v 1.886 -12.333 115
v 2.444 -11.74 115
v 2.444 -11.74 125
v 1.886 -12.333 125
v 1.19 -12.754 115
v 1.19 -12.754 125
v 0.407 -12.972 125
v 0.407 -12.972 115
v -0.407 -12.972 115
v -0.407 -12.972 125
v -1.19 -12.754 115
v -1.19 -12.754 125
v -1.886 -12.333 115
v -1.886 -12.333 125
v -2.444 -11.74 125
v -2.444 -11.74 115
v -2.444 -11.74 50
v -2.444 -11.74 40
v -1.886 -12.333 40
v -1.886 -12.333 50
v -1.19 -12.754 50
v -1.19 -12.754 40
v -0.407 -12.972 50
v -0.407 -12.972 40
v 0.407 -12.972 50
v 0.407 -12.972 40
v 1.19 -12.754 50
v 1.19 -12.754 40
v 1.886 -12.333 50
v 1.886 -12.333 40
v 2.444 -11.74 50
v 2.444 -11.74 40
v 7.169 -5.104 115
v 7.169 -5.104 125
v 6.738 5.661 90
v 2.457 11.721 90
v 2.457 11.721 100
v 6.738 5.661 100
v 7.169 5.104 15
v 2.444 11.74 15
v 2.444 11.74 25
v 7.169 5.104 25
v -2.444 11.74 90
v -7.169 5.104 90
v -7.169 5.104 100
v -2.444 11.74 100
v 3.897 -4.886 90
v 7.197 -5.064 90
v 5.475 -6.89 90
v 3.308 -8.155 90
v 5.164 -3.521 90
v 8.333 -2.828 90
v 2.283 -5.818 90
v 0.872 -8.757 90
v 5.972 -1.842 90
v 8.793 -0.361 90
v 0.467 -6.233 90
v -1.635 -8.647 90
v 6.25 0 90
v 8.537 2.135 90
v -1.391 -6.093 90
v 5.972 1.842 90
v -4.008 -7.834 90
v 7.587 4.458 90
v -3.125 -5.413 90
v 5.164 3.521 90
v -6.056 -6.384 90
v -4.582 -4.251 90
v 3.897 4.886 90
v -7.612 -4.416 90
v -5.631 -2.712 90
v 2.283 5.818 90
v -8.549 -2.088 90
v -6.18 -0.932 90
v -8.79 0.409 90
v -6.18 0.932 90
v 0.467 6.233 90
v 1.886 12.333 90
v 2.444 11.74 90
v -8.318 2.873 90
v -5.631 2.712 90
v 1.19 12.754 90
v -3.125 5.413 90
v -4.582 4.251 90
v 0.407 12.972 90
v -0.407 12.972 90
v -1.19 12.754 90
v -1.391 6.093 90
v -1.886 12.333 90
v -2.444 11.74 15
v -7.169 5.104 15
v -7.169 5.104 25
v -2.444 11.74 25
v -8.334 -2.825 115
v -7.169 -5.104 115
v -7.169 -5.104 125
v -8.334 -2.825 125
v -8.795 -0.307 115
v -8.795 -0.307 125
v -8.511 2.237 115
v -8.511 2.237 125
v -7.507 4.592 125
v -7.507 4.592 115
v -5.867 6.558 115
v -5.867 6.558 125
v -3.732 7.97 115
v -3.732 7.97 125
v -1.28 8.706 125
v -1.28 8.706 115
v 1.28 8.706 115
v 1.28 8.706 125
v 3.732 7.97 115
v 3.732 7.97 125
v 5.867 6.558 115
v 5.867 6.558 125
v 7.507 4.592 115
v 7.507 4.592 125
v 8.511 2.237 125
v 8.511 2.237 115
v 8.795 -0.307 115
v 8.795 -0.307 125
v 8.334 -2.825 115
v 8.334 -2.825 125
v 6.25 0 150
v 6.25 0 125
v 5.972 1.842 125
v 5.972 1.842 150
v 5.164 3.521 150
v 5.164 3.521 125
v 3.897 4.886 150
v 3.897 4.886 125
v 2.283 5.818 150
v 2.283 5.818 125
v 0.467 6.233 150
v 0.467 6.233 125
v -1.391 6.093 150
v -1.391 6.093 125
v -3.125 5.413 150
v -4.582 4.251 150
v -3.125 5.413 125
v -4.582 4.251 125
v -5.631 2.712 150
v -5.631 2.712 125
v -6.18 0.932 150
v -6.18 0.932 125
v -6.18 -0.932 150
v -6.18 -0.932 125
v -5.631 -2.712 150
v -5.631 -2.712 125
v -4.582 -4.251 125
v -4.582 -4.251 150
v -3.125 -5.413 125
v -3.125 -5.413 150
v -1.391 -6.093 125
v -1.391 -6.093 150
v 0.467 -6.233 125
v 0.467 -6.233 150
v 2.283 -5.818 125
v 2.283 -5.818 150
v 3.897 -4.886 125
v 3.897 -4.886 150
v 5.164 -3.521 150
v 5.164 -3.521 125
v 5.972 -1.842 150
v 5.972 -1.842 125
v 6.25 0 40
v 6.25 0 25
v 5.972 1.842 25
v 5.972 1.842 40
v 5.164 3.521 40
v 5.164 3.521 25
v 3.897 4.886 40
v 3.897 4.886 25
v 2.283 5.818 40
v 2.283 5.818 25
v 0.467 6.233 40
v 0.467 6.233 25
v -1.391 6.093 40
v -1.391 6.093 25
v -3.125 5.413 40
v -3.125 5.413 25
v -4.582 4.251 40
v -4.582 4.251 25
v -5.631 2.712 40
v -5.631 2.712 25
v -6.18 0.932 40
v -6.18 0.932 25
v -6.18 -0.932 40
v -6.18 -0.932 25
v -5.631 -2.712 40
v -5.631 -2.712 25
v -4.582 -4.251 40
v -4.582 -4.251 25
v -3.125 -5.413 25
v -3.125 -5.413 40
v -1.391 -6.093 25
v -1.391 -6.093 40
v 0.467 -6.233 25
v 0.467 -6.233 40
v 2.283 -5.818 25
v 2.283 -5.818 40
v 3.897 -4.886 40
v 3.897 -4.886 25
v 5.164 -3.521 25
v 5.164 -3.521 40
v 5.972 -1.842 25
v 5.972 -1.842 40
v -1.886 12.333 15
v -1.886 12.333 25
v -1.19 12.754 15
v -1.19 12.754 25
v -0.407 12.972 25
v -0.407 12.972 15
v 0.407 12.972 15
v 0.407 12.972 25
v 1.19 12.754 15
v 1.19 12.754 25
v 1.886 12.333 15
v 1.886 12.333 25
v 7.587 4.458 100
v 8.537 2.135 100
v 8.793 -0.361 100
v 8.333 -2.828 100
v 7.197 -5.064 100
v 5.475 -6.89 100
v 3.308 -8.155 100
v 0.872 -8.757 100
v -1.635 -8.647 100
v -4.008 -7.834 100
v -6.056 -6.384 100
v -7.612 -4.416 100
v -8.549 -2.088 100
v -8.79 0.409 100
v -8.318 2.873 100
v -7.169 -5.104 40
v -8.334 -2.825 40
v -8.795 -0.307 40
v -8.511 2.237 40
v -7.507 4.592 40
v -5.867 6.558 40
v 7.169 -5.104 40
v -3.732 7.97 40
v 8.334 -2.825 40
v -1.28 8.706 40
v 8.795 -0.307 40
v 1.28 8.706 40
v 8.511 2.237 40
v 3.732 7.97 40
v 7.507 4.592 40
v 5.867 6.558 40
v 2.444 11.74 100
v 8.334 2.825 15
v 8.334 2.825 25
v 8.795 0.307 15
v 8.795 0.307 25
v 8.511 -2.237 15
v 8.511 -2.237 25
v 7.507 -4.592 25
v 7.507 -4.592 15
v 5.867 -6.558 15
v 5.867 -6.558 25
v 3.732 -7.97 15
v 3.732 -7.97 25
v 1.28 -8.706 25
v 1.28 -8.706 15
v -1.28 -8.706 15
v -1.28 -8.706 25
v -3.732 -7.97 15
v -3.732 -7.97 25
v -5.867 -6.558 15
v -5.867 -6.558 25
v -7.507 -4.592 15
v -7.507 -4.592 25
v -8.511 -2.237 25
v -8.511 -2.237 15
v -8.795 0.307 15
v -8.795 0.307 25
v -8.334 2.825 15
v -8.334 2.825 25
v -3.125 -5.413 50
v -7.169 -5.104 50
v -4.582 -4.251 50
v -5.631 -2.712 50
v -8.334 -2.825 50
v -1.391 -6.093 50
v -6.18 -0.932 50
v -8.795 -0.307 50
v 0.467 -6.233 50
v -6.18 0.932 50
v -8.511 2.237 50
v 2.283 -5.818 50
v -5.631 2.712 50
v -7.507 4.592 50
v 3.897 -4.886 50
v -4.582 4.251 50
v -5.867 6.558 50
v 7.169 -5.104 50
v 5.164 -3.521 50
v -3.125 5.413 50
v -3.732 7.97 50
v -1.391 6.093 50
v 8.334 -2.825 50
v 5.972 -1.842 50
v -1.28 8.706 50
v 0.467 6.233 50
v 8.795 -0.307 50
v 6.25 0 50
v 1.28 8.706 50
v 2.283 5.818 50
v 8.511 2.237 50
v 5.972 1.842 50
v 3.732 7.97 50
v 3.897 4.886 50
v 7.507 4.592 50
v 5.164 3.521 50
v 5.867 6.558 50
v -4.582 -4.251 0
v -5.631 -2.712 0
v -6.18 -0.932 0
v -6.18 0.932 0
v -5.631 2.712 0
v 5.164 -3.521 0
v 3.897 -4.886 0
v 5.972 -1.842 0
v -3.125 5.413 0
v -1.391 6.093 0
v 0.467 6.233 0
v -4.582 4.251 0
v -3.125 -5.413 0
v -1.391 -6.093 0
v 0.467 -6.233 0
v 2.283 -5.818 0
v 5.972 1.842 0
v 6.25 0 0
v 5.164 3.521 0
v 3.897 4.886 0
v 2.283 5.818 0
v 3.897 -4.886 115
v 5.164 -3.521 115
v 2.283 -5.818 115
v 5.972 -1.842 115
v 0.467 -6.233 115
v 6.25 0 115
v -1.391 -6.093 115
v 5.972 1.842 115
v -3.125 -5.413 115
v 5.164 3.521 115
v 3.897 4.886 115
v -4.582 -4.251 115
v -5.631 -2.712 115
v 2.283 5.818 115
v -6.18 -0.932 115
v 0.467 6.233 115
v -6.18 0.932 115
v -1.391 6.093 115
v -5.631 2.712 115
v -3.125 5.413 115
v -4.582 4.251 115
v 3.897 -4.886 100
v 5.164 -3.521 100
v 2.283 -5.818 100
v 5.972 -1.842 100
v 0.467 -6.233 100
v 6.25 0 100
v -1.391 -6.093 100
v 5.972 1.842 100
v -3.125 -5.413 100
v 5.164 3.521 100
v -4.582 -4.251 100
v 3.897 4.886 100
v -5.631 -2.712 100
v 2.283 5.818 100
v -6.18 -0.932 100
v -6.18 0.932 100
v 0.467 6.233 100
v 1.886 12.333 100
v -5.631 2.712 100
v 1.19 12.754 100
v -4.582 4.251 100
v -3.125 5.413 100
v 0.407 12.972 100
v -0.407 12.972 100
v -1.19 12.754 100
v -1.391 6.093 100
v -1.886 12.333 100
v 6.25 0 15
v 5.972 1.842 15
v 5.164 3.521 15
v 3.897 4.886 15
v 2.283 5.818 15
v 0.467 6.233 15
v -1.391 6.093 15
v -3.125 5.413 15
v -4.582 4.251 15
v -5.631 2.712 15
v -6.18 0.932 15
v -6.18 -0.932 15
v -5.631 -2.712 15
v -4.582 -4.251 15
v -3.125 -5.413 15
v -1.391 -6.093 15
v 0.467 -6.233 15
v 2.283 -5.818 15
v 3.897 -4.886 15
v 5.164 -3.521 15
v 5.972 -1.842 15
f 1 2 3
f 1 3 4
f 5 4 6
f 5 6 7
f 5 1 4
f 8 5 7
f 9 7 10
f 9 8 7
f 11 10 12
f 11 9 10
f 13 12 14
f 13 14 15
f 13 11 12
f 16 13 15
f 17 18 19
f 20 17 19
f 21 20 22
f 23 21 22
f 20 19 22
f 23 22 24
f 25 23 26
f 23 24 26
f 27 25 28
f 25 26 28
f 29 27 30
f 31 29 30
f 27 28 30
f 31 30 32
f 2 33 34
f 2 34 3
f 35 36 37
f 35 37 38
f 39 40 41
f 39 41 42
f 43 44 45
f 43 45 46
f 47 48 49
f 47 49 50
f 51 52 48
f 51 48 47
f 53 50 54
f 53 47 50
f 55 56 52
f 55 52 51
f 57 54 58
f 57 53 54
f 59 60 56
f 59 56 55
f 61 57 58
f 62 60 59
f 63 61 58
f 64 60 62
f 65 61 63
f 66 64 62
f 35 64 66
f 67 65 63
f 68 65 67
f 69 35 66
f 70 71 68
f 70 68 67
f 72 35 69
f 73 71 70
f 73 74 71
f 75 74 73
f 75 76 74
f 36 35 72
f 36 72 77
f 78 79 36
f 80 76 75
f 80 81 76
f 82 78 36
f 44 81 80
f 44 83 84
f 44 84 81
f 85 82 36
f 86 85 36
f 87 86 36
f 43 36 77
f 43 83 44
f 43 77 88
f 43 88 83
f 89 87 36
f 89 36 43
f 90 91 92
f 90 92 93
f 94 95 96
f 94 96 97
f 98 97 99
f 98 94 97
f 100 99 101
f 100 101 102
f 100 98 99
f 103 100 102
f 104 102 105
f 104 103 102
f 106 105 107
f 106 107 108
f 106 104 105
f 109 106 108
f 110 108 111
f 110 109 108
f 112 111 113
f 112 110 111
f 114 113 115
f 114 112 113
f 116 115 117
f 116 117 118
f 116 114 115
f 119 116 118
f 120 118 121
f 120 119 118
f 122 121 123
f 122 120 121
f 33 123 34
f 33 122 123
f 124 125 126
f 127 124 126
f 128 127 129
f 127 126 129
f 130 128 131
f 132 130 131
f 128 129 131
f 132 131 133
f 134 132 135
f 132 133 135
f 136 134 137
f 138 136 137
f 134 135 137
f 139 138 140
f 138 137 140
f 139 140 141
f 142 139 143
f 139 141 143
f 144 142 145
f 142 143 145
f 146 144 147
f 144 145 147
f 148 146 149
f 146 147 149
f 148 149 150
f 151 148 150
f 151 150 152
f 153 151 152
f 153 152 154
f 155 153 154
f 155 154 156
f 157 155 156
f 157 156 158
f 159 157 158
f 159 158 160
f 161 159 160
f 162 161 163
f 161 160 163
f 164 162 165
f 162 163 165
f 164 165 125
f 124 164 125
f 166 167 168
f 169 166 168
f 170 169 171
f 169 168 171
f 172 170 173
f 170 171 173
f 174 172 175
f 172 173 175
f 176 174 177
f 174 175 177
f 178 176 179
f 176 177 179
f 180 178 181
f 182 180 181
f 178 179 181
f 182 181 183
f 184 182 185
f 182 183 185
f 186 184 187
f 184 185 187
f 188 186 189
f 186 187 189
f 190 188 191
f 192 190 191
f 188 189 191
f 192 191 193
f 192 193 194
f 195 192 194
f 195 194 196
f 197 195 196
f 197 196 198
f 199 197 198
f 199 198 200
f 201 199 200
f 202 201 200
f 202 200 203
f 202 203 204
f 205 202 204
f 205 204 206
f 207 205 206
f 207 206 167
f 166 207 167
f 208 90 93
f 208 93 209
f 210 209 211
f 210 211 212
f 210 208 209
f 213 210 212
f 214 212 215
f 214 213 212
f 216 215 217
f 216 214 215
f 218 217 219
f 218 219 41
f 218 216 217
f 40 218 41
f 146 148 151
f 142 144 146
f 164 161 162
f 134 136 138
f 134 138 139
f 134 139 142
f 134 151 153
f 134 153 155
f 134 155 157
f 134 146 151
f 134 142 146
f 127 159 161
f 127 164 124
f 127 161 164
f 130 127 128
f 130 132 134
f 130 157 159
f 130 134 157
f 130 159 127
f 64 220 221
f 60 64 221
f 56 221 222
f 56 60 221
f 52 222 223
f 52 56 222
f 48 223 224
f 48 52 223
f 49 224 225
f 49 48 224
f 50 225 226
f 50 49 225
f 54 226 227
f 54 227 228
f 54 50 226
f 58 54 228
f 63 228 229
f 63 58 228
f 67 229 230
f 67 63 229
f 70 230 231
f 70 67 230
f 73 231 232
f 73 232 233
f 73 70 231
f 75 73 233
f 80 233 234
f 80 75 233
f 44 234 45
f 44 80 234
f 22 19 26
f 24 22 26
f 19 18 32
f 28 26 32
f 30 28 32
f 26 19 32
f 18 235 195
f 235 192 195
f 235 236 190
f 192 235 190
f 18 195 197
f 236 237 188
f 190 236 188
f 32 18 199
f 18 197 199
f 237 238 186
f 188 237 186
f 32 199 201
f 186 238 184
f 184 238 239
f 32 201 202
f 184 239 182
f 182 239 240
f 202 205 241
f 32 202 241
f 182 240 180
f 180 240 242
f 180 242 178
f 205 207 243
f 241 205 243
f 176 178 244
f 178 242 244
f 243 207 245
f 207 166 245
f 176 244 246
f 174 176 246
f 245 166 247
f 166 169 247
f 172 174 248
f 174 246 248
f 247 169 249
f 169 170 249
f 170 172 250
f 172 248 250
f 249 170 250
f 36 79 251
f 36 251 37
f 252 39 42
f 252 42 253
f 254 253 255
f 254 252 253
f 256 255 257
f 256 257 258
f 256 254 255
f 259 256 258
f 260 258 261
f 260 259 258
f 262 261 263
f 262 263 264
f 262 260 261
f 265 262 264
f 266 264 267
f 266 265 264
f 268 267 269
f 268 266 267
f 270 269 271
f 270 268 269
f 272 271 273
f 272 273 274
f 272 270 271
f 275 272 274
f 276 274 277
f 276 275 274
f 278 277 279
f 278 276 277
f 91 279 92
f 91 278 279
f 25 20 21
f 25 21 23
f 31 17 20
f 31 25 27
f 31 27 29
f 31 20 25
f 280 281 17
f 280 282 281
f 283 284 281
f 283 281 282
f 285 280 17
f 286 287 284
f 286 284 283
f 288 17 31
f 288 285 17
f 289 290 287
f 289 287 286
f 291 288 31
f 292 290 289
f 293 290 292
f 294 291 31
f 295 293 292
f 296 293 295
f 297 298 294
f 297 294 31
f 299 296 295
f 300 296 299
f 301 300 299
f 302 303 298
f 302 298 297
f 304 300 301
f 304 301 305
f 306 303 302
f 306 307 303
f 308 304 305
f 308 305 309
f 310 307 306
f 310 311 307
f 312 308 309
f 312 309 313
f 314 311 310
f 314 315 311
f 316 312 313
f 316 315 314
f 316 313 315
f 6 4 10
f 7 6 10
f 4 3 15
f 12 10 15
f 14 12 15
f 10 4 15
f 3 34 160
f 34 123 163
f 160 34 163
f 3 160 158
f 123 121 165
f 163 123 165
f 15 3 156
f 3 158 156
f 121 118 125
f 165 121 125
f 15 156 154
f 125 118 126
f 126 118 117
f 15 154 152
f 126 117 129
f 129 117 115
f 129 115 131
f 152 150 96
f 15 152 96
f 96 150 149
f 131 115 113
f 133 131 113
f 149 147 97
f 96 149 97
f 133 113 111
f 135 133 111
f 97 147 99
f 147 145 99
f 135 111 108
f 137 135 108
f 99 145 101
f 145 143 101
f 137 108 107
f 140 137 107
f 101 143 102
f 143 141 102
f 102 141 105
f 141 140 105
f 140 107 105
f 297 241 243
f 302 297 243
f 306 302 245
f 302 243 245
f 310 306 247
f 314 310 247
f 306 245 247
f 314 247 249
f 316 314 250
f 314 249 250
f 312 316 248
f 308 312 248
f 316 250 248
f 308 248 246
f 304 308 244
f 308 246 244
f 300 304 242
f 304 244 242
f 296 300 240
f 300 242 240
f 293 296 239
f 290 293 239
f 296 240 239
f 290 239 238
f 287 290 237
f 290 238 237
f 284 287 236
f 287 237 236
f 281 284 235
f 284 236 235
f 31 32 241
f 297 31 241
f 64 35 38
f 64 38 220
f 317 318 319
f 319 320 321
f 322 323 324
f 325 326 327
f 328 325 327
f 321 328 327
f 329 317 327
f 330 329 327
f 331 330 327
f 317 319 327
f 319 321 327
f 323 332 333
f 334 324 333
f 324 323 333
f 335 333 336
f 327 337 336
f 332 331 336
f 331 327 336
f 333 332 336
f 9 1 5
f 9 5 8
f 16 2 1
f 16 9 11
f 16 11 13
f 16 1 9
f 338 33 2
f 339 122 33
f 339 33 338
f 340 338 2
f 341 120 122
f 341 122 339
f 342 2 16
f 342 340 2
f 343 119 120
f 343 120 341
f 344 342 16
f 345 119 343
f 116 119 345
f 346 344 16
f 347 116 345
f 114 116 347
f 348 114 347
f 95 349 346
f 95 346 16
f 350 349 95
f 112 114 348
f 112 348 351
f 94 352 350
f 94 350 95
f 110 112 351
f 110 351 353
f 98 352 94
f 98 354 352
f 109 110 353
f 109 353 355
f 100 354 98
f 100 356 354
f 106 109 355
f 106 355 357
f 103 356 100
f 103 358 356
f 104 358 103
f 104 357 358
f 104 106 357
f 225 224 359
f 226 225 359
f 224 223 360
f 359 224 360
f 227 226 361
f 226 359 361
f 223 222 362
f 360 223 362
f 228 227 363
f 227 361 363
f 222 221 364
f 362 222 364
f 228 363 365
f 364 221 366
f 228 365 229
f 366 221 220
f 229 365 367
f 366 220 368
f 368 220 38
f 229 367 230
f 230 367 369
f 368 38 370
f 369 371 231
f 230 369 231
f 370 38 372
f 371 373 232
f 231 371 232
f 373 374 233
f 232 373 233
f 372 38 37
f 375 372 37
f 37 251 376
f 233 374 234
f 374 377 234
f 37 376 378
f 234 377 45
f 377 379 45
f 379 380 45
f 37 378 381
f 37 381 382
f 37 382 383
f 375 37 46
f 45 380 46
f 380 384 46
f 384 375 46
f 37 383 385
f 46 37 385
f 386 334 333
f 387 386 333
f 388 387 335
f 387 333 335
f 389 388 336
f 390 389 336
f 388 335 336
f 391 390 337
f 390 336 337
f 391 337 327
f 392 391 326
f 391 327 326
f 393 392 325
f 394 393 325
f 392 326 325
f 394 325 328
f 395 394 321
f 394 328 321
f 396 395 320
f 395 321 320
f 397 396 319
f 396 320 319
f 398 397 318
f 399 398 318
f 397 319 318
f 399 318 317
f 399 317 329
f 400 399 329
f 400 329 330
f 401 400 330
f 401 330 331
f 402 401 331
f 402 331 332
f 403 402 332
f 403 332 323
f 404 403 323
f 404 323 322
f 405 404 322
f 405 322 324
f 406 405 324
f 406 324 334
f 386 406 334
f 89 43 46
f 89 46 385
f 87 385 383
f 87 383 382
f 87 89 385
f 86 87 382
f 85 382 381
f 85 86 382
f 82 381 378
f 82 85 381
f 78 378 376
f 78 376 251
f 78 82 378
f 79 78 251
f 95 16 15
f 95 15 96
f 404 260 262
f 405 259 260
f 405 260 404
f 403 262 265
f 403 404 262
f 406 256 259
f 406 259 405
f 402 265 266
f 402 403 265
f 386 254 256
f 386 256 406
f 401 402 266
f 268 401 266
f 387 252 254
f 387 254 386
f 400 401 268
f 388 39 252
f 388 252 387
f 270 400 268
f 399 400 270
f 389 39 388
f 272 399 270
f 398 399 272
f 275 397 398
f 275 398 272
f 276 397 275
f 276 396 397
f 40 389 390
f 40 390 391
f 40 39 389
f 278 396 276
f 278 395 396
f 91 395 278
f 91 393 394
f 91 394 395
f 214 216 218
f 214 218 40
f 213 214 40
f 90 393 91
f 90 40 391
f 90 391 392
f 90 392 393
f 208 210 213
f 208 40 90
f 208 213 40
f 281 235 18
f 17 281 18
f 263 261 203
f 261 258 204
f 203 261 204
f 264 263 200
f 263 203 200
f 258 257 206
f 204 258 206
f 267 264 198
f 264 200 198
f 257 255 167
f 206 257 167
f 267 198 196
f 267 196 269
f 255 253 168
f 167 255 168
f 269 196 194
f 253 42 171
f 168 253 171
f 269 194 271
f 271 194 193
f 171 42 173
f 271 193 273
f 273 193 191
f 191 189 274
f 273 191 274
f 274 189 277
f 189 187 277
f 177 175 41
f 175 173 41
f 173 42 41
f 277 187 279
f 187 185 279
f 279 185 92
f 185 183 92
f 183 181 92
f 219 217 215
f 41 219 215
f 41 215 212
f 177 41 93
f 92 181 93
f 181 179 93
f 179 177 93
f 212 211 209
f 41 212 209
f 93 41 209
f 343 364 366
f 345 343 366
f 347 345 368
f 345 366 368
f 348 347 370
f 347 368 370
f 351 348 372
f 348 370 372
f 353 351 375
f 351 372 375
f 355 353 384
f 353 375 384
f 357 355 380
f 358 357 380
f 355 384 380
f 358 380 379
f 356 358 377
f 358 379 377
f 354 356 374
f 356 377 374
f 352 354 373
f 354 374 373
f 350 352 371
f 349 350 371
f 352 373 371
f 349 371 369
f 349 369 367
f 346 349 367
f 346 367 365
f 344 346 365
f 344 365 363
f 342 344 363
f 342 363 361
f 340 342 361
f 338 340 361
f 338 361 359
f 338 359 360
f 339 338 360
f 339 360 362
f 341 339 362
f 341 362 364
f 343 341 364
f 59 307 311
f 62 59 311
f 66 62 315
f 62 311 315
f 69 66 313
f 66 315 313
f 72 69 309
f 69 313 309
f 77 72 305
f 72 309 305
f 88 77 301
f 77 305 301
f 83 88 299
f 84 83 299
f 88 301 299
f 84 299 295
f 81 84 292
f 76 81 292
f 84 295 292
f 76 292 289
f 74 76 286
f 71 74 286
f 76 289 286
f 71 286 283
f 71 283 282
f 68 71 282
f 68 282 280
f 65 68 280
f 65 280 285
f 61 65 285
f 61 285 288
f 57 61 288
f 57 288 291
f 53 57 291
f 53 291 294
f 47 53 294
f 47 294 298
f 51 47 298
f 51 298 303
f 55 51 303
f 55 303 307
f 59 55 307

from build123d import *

# Parameters (mm, degrees)
SKETCH1_R           = 6.25
BOSS_EXTRUDE1_DEPTH = 125
SKETCH3_R           = 6.25
BOSS_EXTRUDE2_DEPTH = 10
SKETCH6_R           = 6.25
BOSS_EXTRUDE3_DEPTH = 10
SKETCH8_R           = 6.25
BOSS_EXTRUDE4_DEPTH = 10
SKETCH9_R           = 6.25
BOSS_EXTRUDE6_DEPTH = 10
SKETCH14_R          = 6.25
BOSS_EXTRUDE7_DEPTH = 25


with BuildPart() as part:
    # Sketch1 → Boss-Extrude1 (new body)
    with BuildSketch(Plane.XY):
        Circle(SKETCH1_R)
    extrude(amount=BOSS_EXTRUDE1_DEPTH)

    # Sketch3 → Boss-Extrude2 (add)
    with BuildSketch(Plane(origin=(0, 0, 15), x_dir=(-1, 0, 0), z_dir=(0, 0, -1))):
        with BuildLine():
            Line((-2.443849423, 11.74), (-7.168624973, 5.104))
            ThreePointArc((-7.168624973, 5.104), (0, -8.8), (7.168624973, 5.104))
            Line((7.168624973, 5.104), (2.443849423, 11.74))
            ThreePointArc((2.443849423, 11.74), (0, 13), (-2.443849423, 11.74))
        make_face()
        Circle(SKETCH3_R, mode=Mode.SUBTRACT)
    extrude(amount=-BOSS_EXTRUDE2_DEPTH)

    # Sketch6 → Boss-Extrude3 (add)
    with BuildSketch(Plane(origin=(0, 0, 40), x_dir=(-1, 0, 0), z_dir=(0, 0, -1))):
        with BuildLine():
            Line((-2.443849423, -11.74), (-7.168624973, -5.104))
            ThreePointArc((-7.168624973, -5.104), (0, 8.8), (7.168624973, -5.104))
            Line((7.168624973, -5.104), (2.443849423, -11.74))
            ThreePointArc((2.443849423, -11.74), (0, -13), (-2.443849423, -11.74))
        make_face()
        Circle(SKETCH6_R, mode=Mode.SUBTRACT)
    extrude(amount=-BOSS_EXTRUDE3_DEPTH)

    # Sketch8 → Boss-Extrude4 (add)
    with BuildSketch(Plane(origin=(0, 0, 90), x_dir=(-1, 0, 0), z_dir=(0, 0, -1))):
        with BuildLine():
            ThreePointArc((2.443849423, 11.74), (0, 13), (-2.443849423, 11.74))
            Line((-2.443849423, 11.74), (-2.456936947, 11.721470546))
            Line((-2.456936947, 11.721470546), (-6.737843427, 5.66051817))
            Line((-6.737843427, 5.66051817), (-7.587481927, 4.457591055))
            ThreePointArc((-7.587481927, 4.457591055), (0.385125198, -8.791568608), (7.168624973, 5.104))
            Line((7.168624973, 5.104), (2.443849423, 11.74))
        make_face()
        Circle(SKETCH8_R, mode=Mode.SUBTRACT)
    extrude(amount=-BOSS_EXTRUDE4_DEPTH)

    # Sketch9 → Boss-Extrude6 (add)
    with BuildSketch(Plane(origin=(0, 0, 115), x_dir=(-1, 0, 0), z_dir=(0, 0, -1))):
        with BuildLine():
            Line((2.443849423, -11.74), (7.168624973, -5.104))
            ThreePointArc((7.168624973, -5.104), (0, 8.8), (-7.168624973, -5.104))
            Line((-7.168624973, -5.104), (-2.443849423, -11.74))
            ThreePointArc((-2.443849423, -11.74), (0, -13), (2.443849423, -11.74))
        make_face()
        Circle(SKETCH9_R, mode=Mode.SUBTRACT)
    extrude(amount=-BOSS_EXTRUDE6_DEPTH)

    # Sketch14 → Boss-Extrude7 (add)
    with BuildSketch(Plane.XY.offset(125)):
        Circle(SKETCH14_R)
    extrude(amount=BOSS_EXTRUDE7_DEPTH)


solid = part.part
